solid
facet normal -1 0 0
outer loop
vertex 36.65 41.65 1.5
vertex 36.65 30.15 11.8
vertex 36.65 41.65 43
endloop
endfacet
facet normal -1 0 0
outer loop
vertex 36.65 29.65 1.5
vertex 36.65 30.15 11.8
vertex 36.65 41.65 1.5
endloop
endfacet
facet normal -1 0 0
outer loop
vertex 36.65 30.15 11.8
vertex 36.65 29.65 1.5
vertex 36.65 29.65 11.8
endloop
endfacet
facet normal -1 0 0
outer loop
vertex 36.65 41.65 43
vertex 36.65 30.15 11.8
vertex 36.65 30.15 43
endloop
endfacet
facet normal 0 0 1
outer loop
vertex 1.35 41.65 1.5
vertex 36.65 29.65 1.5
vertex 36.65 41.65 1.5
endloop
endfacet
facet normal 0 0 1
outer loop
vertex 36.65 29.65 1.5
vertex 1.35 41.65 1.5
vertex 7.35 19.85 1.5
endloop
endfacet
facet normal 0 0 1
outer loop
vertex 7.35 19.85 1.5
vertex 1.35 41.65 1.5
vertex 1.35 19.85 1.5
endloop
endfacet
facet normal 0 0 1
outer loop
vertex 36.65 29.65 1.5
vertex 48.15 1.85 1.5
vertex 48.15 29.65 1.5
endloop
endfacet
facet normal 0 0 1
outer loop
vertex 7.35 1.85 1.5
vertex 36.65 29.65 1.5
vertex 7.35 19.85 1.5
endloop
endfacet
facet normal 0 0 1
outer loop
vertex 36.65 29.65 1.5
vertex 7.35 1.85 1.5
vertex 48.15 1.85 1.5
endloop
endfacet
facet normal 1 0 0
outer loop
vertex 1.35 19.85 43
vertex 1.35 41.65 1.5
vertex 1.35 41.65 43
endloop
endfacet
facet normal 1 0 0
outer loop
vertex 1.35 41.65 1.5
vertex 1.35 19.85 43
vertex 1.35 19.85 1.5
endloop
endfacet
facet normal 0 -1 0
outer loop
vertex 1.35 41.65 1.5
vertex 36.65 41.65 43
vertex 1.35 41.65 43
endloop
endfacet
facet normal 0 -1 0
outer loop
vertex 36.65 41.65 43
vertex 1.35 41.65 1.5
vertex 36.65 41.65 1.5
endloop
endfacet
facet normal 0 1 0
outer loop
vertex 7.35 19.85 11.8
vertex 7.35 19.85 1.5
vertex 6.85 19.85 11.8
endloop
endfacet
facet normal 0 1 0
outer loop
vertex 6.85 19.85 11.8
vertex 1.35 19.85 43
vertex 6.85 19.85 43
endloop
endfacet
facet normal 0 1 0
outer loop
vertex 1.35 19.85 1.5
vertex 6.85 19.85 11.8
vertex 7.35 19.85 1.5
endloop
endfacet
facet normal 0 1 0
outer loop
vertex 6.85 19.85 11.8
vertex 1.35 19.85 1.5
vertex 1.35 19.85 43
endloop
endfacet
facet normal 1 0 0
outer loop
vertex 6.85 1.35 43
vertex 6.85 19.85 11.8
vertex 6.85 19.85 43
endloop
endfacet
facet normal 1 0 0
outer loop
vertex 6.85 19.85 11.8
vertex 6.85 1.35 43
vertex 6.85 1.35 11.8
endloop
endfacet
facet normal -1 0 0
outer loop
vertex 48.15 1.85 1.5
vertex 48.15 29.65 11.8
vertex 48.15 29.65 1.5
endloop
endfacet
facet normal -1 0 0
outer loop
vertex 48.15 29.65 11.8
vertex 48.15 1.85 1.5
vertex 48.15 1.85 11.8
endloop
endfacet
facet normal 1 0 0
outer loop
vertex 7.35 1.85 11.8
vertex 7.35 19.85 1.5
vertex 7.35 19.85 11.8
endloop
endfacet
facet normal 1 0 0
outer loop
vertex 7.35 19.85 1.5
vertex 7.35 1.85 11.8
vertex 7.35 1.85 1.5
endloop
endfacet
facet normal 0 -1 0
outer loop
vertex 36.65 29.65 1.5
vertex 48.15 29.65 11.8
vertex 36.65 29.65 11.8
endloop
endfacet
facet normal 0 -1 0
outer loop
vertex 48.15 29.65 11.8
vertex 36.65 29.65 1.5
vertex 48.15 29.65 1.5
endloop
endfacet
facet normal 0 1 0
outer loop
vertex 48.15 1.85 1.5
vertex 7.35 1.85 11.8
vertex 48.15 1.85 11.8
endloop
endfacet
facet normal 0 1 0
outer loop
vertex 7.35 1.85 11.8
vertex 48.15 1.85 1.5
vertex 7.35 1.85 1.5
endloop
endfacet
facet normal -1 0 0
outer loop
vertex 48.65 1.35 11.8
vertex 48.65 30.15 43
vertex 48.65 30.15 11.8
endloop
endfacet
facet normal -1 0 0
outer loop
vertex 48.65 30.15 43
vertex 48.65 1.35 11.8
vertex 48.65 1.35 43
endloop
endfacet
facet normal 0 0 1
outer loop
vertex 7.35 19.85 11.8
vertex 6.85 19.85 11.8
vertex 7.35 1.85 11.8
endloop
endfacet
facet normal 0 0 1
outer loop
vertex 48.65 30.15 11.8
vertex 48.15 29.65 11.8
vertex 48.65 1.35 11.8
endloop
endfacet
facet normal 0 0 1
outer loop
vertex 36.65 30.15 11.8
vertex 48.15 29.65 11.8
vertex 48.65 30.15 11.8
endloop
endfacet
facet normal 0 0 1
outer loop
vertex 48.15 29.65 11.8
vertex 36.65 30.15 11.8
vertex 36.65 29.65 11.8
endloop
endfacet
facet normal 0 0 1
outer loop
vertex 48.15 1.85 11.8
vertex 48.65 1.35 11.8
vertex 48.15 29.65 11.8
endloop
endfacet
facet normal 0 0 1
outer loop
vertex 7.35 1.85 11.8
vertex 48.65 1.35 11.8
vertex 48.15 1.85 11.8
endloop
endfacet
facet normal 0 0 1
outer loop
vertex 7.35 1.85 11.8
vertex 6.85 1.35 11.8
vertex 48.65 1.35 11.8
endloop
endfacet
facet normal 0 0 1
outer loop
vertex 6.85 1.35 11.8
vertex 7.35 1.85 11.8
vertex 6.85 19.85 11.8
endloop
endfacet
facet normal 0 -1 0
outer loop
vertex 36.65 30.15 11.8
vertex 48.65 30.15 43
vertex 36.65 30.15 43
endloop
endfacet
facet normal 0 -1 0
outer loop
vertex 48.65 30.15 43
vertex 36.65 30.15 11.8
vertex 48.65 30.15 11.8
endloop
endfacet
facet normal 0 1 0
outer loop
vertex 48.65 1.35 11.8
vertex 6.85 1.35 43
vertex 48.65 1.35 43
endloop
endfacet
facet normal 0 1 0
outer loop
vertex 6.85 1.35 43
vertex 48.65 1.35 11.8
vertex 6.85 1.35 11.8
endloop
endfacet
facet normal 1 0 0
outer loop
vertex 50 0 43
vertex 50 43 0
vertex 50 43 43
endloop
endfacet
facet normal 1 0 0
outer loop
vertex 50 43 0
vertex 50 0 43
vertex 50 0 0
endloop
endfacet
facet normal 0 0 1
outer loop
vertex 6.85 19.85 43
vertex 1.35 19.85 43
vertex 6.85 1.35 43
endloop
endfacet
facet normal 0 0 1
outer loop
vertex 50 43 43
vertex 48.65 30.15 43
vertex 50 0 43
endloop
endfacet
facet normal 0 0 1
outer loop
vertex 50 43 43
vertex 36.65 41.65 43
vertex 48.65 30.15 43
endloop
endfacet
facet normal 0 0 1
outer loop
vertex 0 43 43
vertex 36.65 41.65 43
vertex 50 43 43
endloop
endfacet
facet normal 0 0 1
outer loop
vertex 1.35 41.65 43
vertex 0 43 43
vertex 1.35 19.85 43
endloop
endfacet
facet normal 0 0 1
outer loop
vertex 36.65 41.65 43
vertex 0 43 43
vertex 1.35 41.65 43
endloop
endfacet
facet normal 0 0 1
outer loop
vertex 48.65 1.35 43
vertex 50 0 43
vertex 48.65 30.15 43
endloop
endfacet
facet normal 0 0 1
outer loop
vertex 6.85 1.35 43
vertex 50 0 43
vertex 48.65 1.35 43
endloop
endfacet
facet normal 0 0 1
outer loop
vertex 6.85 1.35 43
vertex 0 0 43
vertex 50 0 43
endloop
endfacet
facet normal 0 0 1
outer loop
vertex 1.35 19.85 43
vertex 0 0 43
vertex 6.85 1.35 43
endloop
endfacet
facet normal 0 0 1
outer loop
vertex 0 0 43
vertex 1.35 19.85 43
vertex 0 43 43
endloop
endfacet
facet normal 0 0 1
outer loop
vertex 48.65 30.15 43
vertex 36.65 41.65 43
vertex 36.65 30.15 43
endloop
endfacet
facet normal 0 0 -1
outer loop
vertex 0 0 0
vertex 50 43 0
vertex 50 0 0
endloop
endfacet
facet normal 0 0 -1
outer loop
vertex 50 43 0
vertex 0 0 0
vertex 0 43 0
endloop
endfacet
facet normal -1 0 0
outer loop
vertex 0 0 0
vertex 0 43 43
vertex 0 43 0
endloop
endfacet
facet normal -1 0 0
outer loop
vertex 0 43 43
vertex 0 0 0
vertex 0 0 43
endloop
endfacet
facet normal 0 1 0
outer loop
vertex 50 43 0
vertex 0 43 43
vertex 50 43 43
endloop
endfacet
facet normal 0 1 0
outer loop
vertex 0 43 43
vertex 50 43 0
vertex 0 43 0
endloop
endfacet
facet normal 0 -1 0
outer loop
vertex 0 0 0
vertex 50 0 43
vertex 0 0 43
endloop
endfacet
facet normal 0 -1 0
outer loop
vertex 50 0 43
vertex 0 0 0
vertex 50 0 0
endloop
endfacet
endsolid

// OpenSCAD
inner_width=47;
inner_height=40;
inner_depth=40;
thick=1.5;
wavgat_x = 41.5;
wavgat_y = 28.5;
wavgat_z = 11.5;
wavgat_d = 1.2;
esp_x = 35;
esp_y = 40-18.5;


module inner(d=0) {
    translate([-d,inner_height - esp_y-d,0]) cube([esp_x +2*d, esp_y+2*d, inner_depth +2*thick+1]);
    translate([inner_width - wavgat_x-d,wavgat_y-1-d,0]) cube([esp_x-inner_width + wavgat_x+2*d , inner_height -wavgat_y+2*d, inner_depth +2*thick+1]);
    translate([inner_width - wavgat_x+.5-d,.5-d,0]) cube([wavgat_x-1+2*d , wavgat_y-1+2*d, wavgat_z]);
    translate([inner_width - wavgat_x-d,-d,wavgat_z-wavgat_d]) cube([wavgat_x+2*d , wavgat_y+2*d, inner_depth +2*thick+1]);
}

module shell() {
difference() {
    cube([inner_width + 2*thick, inner_height + 2* thick, inner_depth +2*thick]);
    translate([thick,thick,thick]) inner(.15);
}
}

module cover() {
translate([inner_width + 2*thick + 5,0,0]) {
    difference() {
        union() {
            translate([0,0,inner_height+thick]) cube([inner_width+2*thick,inner_height+2*thick,thick]);
        inner();
        }
        translate([-1,-1,-1]) cube([inner_width+2, inner_height+2, wavgat_z+1]);
        translate([-1,-1,inner_height+2*thick]) cube([inner_width+2, inner_height+2, inner_height]);
        
        translate([inner_width - wavgat_x+thick,thick,0]) cube([wavgat_x-2*thick , wavgat_y-2*thick, inner_depth]);
       
        translate([-1,wavgat_y,0]) cube([esp_x+2 , inner_height -wavgat_y+1, inner_depth ]);
        translate([inner_width - wavgat_x+thick,wavgat_y-2,0]) cube([esp_x-inner_width + wavgat_x -2*thick, inner_height -wavgat_y-2*thick, inner_depth ]);
        
        translate([inner_width - wavgat_x + 20 + thick-4, 15+thick-4,0]) cube([8,8,inner_depth+2*thick +2], centered=true);
    }
    
}
}

//cover();
shell();
